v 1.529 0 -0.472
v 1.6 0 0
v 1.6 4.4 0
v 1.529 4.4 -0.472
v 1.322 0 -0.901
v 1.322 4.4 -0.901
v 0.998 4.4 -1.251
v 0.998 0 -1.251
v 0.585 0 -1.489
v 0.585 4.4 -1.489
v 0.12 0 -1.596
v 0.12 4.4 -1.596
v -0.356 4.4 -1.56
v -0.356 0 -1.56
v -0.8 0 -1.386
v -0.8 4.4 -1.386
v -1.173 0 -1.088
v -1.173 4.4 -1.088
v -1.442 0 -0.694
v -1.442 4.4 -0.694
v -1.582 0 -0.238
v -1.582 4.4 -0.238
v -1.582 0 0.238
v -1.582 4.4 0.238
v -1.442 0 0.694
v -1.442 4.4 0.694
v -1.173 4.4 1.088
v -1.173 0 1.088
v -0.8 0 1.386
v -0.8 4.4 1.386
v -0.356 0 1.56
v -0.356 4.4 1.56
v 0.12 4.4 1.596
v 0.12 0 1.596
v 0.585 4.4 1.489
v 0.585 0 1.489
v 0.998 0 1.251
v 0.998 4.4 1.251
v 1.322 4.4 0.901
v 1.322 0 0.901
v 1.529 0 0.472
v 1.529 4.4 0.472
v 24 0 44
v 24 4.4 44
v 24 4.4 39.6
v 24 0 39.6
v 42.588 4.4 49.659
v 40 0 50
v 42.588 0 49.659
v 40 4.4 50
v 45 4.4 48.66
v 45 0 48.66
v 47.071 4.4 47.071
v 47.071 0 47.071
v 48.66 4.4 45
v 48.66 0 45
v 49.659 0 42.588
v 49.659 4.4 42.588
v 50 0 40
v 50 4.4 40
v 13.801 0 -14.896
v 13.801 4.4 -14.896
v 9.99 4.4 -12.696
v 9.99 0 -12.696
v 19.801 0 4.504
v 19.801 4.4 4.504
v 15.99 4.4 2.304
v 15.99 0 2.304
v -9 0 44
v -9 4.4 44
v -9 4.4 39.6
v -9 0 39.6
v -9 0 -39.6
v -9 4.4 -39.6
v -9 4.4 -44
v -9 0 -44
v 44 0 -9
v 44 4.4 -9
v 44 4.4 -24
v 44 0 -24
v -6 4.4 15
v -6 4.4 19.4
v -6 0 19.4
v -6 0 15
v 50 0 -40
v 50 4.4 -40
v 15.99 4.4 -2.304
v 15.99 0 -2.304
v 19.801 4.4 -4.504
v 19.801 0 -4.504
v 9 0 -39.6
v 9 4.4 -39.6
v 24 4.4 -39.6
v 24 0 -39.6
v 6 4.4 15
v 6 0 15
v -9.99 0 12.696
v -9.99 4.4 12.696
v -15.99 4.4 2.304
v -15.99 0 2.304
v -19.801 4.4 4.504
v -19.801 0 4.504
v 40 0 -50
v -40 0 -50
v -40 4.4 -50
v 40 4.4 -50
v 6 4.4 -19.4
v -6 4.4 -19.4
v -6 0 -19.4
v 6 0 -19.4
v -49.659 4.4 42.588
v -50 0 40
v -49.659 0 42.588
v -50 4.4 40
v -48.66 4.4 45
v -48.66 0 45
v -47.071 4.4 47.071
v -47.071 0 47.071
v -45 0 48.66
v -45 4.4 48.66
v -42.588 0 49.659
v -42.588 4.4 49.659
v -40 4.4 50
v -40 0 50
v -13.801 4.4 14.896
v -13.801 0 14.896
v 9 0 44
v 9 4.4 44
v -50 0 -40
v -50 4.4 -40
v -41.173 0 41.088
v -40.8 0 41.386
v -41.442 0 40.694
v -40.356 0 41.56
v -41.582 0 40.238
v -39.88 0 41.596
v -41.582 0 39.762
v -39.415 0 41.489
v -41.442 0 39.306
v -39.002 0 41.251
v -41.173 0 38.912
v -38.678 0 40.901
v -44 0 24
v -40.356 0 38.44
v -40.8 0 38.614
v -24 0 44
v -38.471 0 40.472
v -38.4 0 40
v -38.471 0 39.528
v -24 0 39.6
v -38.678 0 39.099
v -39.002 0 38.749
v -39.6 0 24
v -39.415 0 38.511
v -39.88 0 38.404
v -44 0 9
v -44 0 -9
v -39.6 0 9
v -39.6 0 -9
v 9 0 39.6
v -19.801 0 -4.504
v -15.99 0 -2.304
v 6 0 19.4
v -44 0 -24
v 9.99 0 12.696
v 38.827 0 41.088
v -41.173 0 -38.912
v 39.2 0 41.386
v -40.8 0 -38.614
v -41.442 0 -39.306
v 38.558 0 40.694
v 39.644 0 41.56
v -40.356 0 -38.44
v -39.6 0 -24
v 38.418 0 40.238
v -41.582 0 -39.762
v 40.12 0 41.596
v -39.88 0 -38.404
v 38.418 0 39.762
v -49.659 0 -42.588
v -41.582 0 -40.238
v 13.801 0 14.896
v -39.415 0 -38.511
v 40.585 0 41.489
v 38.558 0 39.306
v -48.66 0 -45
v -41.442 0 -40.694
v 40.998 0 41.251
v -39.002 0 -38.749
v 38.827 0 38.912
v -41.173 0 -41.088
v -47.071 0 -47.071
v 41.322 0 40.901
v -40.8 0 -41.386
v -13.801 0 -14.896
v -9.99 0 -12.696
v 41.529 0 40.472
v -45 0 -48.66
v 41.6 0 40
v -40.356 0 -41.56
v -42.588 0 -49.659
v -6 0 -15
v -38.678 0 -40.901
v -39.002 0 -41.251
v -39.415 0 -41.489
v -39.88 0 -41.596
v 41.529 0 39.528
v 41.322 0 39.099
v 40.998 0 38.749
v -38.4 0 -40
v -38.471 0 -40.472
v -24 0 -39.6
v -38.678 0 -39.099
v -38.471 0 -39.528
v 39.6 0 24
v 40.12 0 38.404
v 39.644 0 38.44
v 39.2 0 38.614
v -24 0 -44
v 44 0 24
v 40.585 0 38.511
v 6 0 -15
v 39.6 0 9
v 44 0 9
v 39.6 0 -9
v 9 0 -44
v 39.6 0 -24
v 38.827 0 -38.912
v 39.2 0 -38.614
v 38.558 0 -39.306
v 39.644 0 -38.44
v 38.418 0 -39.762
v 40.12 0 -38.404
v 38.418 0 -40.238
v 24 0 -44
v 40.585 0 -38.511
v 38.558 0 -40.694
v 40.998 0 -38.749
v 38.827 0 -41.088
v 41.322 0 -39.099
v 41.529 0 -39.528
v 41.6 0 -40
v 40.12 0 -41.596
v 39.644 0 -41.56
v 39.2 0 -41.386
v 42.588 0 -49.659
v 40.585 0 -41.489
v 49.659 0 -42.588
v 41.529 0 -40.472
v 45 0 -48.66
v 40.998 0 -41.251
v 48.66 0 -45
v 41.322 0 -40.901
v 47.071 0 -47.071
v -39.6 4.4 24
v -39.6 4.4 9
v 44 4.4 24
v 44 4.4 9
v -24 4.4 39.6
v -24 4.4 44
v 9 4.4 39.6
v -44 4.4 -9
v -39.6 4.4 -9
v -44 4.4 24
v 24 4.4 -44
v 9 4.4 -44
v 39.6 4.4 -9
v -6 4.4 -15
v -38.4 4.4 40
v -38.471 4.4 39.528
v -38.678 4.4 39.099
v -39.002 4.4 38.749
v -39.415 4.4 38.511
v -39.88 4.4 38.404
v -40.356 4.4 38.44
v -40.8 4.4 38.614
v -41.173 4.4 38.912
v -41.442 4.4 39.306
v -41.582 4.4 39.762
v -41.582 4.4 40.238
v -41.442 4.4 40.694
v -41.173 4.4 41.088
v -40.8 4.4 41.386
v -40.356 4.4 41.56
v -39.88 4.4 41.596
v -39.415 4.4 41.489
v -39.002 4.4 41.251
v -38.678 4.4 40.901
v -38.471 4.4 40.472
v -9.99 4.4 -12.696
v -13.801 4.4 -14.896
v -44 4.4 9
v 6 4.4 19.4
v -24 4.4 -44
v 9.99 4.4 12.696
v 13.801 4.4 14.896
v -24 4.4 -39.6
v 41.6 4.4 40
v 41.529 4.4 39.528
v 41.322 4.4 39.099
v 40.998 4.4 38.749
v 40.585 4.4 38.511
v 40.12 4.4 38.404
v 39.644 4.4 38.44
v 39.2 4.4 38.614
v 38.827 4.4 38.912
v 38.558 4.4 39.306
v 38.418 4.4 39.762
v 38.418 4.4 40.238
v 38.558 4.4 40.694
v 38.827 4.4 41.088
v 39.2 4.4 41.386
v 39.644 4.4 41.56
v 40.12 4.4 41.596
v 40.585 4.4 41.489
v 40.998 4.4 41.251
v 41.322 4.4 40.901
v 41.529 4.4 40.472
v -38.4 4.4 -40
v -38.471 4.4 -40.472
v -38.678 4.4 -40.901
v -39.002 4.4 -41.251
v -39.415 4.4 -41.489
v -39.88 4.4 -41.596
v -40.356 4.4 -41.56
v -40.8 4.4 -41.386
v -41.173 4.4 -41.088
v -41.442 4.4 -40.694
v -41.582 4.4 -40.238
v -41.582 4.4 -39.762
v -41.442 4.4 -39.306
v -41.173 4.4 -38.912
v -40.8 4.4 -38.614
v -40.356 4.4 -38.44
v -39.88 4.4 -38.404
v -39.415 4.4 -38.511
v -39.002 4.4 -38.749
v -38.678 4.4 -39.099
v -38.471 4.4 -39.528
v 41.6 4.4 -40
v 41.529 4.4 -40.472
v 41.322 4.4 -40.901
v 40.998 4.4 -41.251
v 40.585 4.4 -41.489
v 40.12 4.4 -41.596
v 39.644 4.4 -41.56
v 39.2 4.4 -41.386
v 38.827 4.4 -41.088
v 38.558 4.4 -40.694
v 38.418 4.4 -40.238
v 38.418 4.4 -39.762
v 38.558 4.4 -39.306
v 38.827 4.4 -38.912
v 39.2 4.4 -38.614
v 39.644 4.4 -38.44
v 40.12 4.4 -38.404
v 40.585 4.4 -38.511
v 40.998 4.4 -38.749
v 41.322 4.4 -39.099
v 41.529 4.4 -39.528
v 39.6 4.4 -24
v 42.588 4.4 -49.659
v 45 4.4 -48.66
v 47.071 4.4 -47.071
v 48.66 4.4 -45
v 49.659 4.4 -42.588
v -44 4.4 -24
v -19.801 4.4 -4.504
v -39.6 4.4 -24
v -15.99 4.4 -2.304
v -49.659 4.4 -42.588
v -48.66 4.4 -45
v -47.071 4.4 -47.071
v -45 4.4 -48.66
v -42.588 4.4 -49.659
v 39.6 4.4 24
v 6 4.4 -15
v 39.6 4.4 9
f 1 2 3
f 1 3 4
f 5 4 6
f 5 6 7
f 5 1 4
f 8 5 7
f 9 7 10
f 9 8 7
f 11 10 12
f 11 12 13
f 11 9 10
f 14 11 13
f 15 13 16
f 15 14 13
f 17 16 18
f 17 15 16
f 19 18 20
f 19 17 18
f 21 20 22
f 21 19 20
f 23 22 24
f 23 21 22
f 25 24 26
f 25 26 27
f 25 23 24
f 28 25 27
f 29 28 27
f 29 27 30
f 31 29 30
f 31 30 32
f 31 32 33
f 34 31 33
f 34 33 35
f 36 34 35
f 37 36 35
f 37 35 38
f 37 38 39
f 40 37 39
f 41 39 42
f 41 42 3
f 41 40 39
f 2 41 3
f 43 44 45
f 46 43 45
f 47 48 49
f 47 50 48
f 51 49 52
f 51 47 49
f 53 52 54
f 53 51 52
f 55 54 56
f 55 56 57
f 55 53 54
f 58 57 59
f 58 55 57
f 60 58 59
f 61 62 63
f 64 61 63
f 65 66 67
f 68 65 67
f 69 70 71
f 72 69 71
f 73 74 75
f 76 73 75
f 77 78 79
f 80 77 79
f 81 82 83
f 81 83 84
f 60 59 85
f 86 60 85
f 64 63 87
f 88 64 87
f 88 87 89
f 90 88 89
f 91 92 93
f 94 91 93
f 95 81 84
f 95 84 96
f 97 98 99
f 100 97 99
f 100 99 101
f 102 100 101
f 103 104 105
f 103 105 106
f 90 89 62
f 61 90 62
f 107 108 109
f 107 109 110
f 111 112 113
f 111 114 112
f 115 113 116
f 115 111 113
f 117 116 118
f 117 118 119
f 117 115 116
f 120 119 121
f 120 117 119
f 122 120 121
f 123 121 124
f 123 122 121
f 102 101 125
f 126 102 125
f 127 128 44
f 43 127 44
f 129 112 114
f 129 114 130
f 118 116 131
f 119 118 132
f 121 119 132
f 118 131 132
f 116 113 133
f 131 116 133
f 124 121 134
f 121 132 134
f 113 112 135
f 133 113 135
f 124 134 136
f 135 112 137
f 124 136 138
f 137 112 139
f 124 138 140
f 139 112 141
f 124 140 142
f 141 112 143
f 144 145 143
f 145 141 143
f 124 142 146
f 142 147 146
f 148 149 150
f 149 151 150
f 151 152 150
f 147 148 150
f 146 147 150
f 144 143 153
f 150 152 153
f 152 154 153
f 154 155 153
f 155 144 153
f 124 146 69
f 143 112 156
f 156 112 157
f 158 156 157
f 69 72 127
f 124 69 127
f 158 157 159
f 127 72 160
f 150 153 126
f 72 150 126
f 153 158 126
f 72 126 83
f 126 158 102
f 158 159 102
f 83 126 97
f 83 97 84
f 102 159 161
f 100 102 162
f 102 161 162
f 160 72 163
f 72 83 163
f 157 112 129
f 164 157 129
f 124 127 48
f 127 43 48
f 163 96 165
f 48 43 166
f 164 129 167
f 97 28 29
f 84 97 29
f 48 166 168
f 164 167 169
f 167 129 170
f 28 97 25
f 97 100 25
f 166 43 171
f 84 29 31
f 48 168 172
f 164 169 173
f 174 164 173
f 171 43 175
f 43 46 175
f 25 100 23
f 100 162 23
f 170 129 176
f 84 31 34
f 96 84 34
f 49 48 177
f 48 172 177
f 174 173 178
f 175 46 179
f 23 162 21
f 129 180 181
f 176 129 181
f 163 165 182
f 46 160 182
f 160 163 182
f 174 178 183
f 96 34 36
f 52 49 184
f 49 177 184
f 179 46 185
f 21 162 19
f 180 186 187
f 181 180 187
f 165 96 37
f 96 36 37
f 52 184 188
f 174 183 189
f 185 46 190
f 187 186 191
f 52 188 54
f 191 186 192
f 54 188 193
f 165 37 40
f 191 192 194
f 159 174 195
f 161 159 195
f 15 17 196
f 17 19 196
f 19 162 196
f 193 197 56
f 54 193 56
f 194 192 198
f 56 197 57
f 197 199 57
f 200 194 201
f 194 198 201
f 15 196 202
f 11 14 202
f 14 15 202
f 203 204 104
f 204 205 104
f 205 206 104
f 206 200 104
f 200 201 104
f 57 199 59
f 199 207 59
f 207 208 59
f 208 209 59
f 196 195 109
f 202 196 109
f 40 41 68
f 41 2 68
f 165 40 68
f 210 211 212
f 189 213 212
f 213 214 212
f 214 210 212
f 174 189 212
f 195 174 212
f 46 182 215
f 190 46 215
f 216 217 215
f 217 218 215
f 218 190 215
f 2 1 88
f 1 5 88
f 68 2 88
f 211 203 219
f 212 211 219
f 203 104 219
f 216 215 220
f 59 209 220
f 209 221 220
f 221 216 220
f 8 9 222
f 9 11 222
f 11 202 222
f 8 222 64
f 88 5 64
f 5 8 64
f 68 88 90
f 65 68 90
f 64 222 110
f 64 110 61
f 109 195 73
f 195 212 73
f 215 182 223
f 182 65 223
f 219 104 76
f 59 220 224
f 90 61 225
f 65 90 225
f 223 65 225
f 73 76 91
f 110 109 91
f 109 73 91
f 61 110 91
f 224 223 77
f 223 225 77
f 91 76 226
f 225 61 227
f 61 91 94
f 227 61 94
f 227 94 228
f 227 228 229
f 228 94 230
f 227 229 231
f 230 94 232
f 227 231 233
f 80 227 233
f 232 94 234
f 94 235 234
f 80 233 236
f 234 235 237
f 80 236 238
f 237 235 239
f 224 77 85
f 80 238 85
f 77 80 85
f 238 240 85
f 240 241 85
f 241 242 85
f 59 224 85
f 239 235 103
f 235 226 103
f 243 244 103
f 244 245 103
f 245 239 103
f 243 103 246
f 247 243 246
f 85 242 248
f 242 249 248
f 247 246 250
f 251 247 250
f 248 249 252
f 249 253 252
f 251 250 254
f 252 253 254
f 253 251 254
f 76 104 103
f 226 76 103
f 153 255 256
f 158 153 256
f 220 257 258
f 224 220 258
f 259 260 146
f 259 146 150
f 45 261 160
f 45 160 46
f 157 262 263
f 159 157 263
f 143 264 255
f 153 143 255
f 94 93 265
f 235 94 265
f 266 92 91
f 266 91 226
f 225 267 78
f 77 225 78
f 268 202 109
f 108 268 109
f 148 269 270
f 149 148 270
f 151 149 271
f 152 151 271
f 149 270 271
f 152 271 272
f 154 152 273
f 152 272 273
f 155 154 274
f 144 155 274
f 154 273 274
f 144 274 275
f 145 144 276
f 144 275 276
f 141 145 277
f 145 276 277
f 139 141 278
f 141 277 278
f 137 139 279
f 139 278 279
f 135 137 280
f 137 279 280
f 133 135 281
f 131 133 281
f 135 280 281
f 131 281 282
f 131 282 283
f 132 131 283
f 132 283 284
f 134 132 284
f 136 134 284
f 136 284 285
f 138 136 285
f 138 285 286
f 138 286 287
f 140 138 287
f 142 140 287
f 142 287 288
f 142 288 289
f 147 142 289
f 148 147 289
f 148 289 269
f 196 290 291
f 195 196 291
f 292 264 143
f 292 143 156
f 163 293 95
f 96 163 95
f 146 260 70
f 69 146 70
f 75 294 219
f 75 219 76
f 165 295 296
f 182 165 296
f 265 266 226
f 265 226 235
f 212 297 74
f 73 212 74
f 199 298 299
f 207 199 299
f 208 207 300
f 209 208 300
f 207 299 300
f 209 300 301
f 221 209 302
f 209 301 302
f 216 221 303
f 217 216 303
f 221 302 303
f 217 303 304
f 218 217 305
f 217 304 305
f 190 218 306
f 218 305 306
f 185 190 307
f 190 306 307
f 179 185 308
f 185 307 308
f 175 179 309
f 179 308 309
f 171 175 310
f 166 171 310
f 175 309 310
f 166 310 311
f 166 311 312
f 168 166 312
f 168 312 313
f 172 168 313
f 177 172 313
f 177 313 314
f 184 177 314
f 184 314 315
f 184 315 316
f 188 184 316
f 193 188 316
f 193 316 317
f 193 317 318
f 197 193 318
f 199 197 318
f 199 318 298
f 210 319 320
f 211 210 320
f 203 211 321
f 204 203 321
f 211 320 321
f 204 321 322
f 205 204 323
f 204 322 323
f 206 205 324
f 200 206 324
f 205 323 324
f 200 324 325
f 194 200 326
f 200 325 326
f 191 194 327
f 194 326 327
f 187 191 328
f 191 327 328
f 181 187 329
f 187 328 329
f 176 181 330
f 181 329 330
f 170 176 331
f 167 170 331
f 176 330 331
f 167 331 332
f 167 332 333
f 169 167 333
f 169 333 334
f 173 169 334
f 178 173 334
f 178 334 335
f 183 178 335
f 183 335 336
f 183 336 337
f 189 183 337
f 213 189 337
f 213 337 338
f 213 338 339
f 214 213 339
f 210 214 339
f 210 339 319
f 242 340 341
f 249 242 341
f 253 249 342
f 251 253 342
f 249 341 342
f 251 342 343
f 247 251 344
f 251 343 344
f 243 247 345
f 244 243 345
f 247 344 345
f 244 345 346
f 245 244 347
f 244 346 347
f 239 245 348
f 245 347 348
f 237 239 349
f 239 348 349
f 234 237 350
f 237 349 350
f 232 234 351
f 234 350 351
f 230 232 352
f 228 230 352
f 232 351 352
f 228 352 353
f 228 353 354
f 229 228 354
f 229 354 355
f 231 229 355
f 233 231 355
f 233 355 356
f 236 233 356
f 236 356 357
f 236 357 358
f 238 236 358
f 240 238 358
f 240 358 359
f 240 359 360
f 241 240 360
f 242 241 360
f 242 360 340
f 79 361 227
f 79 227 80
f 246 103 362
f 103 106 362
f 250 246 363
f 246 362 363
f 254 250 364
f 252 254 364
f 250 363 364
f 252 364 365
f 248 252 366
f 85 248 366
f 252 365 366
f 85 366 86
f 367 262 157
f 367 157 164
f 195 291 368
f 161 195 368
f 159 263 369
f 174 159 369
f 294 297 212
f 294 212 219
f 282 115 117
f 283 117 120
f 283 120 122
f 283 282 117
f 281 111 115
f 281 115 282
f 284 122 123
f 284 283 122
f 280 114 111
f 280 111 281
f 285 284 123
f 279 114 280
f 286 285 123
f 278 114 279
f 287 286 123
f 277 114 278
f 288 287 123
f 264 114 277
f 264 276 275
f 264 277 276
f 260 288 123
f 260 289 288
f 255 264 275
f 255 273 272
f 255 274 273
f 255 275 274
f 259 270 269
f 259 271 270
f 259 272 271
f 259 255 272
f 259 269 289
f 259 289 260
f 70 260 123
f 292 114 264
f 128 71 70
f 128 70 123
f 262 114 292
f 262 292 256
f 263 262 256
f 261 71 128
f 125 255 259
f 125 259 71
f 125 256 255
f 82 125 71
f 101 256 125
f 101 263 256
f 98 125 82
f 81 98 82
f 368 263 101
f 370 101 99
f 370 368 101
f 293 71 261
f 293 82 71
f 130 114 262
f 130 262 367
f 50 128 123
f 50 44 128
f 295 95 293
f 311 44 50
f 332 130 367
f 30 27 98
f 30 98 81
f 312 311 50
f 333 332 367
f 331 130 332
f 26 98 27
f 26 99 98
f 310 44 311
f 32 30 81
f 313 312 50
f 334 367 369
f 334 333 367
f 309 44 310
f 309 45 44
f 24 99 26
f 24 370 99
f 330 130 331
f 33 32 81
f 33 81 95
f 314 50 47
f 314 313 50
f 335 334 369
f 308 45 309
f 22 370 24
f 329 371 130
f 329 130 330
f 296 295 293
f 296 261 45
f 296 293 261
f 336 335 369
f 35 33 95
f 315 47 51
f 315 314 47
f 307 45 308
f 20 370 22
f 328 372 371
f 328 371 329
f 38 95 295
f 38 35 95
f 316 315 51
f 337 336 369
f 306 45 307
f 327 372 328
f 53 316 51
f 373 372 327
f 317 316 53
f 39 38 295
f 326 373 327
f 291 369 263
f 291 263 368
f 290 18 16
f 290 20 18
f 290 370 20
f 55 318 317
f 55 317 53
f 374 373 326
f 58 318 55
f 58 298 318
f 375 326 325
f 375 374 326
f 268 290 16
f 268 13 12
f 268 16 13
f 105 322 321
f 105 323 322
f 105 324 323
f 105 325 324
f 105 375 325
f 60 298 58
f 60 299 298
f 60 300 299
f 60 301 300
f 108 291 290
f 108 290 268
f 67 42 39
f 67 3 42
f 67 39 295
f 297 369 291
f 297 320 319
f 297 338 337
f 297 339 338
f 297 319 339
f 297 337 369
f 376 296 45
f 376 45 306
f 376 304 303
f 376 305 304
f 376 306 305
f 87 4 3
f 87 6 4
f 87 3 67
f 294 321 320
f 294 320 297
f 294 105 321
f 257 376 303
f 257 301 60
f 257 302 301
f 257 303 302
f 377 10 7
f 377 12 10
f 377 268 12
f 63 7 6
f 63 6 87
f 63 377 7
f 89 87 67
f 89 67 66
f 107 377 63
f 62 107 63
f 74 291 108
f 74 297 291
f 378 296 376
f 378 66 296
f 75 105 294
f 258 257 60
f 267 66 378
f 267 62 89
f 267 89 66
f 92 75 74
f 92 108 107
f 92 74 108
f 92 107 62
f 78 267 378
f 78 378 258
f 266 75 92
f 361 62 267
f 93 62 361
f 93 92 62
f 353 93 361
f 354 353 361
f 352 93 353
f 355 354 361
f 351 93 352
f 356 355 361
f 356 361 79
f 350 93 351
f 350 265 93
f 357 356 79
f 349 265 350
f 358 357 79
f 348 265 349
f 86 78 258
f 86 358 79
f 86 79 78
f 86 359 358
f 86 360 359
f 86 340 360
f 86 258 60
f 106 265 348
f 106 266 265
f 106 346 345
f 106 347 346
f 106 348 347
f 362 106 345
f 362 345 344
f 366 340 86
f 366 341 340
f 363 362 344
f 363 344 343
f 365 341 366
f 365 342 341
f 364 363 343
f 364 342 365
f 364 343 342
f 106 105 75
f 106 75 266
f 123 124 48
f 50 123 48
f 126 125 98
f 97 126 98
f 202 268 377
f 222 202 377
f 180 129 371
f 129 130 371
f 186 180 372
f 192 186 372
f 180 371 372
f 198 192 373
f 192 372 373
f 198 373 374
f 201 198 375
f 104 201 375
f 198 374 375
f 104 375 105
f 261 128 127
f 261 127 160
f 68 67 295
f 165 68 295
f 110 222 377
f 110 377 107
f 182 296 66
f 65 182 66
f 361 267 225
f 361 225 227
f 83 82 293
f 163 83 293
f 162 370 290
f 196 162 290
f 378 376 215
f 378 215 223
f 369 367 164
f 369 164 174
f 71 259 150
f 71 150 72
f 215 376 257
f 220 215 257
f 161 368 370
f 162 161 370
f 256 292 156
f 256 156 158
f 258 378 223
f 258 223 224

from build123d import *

# Parameters (mm, degrees)
SKETCH_1_W          = 100
SKETCH_1_H          = 100
SKETCH_1_R          = 1.6
EXTRUDE_1_DEPTH     = 4.4
FILLET_1_R          = 10
CUT_EXTRUDE_1_REACH = 6.4
SKETCH_2_R          = 1.6
SKETCH_2_W          = 15
SKETCH_2_H          = 4.4
SKETCH_2_W_2        = 4.4
SKETCH_2_H_2        = 15
SKETCH_3_W          = 12
SKETCH_3_H          = 4.4
CUT_EXTRUDE_2_DEPTH = 5.4


with BuildPart() as part:
    # 草图1 → 凸台-拉伸1 (new body)
    with BuildSketch(Plane(origin=(0, 0, 0), x_dir=(1, 0, 0), z_dir=(0, 1, 0))):
        Rectangle(SKETCH_1_W, SKETCH_1_H)
        Circle(SKETCH_1_R, mode=Mode.SUBTRACT)
    extrude(amount=EXTRUDE_1_DEPTH)

    # 圆角1
    fillet_1_edges = [part.edges().sort_by_distance(p)[0] for p in [
        (50, 2.2, 50),
        (-50, 2.2, 50),
        (-50, 2.2, -50),
        (50, 2.2, -50),
    ]]
    fillet(fillet_1_edges, radius=FILLET_1_R)

    # 草图2 → 切除-拉伸1 (cut, up to next)
    with BuildSketch(Plane(origin=(0, 4.4, 0), x_dir=(1, 0, 0), z_dir=(0, 1, 0)), mode=Mode.PRIVATE) as cut_extrude_1_sk1:
        with Locations((40, 40)):
            Circle(SKETCH_2_R)
    cut_extrude_1_tool1 = extrude(cut_extrude_1_sk1.sketch, amount=-CUT_EXTRUDE_1_REACH, mode=Mode.PRIVATE) & part.part
    add(cut_extrude_1_tool1.solids().sort_by_distance((40, 4.4, -40))[0], mode=Mode.SUBTRACT)
    # 草图2 → 切除-拉伸1 (cut, up to next)
    with BuildSketch(Plane(origin=(0, 4.4, 0), x_dir=(1, 0, 0), z_dir=(0, 1, 0)), mode=Mode.PRIVATE) as cut_extrude_1_sk2:
        with Locations((40, -40)):
            Circle(SKETCH_2_R)
    cut_extrude_1_tool2 = extrude(cut_extrude_1_sk2.sketch, amount=-CUT_EXTRUDE_1_REACH, mode=Mode.PRIVATE) & part.part
    add(cut_extrude_1_tool2.solids().sort_by_distance((40, 4.4, 40))[0], mode=Mode.SUBTRACT)
    # 草图2 → 切除-拉伸1 (cut, up to next)
    with BuildSketch(Plane(origin=(0, 4.4, 0), x_dir=(1, 0, 0), z_dir=(0, 1, 0)), mode=Mode.PRIVATE) as cut_extrude_1_sk3:
        with Locations((-40, -40)):
            Circle(SKETCH_2_R)
    cut_extrude_1_tool3 = extrude(cut_extrude_1_sk3.sketch, amount=-CUT_EXTRUDE_1_REACH, mode=Mode.PRIVATE) & part.part
    add(cut_extrude_1_tool3.solids().sort_by_distance((-40, 4.4, 40))[0], mode=Mode.SUBTRACT)
    # 草图2 → 切除-拉伸1 (cut, up to next)
    with BuildSketch(Plane(origin=(0, 4.4, 0), x_dir=(1, 0, 0), z_dir=(0, 1, 0)), mode=Mode.PRIVATE) as cut_extrude_1_sk4:
        with Locations((-40, 40)):
            Circle(SKETCH_2_R)
    cut_extrude_1_tool4 = extrude(cut_extrude_1_sk4.sketch, amount=-CUT_EXTRUDE_1_REACH, mode=Mode.PRIVATE) & part.part
    add(cut_extrude_1_tool4.solids().sort_by_distance((-40, 4.4, -40))[0], mode=Mode.SUBTRACT)
    # 草图2 → 切除-拉伸1 (cut, up to next)
    with BuildSketch(Plane(origin=(0, 4.4, 0), x_dir=(1, 0, 0), z_dir=(0, 1, 0)), mode=Mode.PRIVATE) as cut_extrude_1_sk5:
        with Locations((-16.5, 41.8)):
            Rectangle(SKETCH_2_W, SKETCH_2_H)
    cut_extrude_1_tool5 = extrude(cut_extrude_1_sk5.sketch, amount=-CUT_EXTRUDE_1_REACH, mode=Mode.PRIVATE) & part.part
    add(cut_extrude_1_tool5.solids().sort_by_distance((-16.5, 4.4, -41.8))[0], mode=Mode.SUBTRACT)
    # 草图2 → 切除-拉伸1 (cut, up to next)
    with BuildSketch(Plane(origin=(0, 4.4, 0), x_dir=(1, 0, 0), z_dir=(0, 1, 0)), mode=Mode.PRIVATE) as cut_extrude_1_sk6:
        with Locations((16.5, 41.8)):
            Rectangle(SKETCH_2_W, SKETCH_2_H)
    cut_extrude_1_tool6 = extrude(cut_extrude_1_sk6.sketch, amount=-CUT_EXTRUDE_1_REACH, mode=Mode.PRIVATE) & part.part
    add(cut_extrude_1_tool6.solids().sort_by_distance((16.5, 4.4, -41.8))[0], mode=Mode.SUBTRACT)
    # 草图2 → 切除-拉伸1 (cut, up to next)
    with BuildSketch(Plane(origin=(0, 4.4, 0), x_dir=(1, 0, 0), z_dir=(0, 1, 0)), mode=Mode.PRIVATE) as cut_extrude_1_sk7:
        with Locations((41.8, -16.5)):
            Rectangle(SKETCH_2_W_2, SKETCH_2_H_2)
    cut_extrude_1_tool7 = extrude(cut_extrude_1_sk7.sketch, amount=-CUT_EXTRUDE_1_REACH, mode=Mode.PRIVATE) & part.part
    add(cut_extrude_1_tool7.solids().sort_by_distance((41.8, 4.4, 16.5))[0], mode=Mode.SUBTRACT)
    # 草图2 → 切除-拉伸1 (cut, up to next)
    with BuildSketch(Plane(origin=(0, 4.4, 0), x_dir=(1, 0, 0), z_dir=(0, 1, 0)), mode=Mode.PRIVATE) as cut_extrude_1_sk8:
        with Locations((41.8, 16.5)):
            Rectangle(SKETCH_2_W_2, SKETCH_2_H_2)
    cut_extrude_1_tool8 = extrude(cut_extrude_1_sk8.sketch, amount=-CUT_EXTRUDE_1_REACH, mode=Mode.PRIVATE) & part.part
    add(cut_extrude_1_tool8.solids().sort_by_distance((41.8, 4.4, -16.5))[0], mode=Mode.SUBTRACT)
    # 草图2 → 切除-拉伸1 (cut, up to next)
    with BuildSketch(Plane(origin=(0, 4.4, 0), x_dir=(1, 0, 0), z_dir=(0, 1, 0)), mode=Mode.PRIVATE) as cut_extrude_1_sk9:
        with Locations((-16.5, -41.8)):
            Rectangle(SKETCH_2_W, SKETCH_2_H)
    cut_extrude_1_tool9 = extrude(cut_extrude_1_sk9.sketch, amount=-CUT_EXTRUDE_1_REACH, mode=Mode.PRIVATE) & part.part
    add(cut_extrude_1_tool9.solids().sort_by_distance((-16.5, 4.4, 41.8))[0], mode=Mode.SUBTRACT)
    # 草图2 → 切除-拉伸1 (cut, up to next)
    with BuildSketch(Plane(origin=(0, 4.4, 0), x_dir=(1, 0, 0), z_dir=(0, 1, 0)), mode=Mode.PRIVATE) as cut_extrude_1_sk10:
        with Locations((16.5, -41.8)):
            Rectangle(SKETCH_2_W, SKETCH_2_H)
    cut_extrude_1_tool10 = extrude(cut_extrude_1_sk10.sketch, amount=-CUT_EXTRUDE_1_REACH, mode=Mode.PRIVATE) & part.part
    add(cut_extrude_1_tool10.solids().sort_by_distance((16.5, 4.4, 41.8))[0], mode=Mode.SUBTRACT)
    # 草图2 → 切除-拉伸1 (cut, up to next)
    with BuildSketch(Plane(origin=(0, 4.4, 0), x_dir=(1, 0, 0), z_dir=(0, 1, 0)), mode=Mode.PRIVATE) as cut_extrude_1_sk11:
        with Locations((-41.8, 16.5)):
            Rectangle(SKETCH_2_W_2, SKETCH_2_H_2)
    cut_extrude_1_tool11 = extrude(cut_extrude_1_sk11.sketch, amount=-CUT_EXTRUDE_1_REACH, mode=Mode.PRIVATE) & part.part
    add(cut_extrude_1_tool11.solids().sort_by_distance((-41.8, 4.4, -16.5))[0], mode=Mode.SUBTRACT)
    # 草图2 → 切除-拉伸1 (cut, up to next)
    with BuildSketch(Plane(origin=(0, 4.4, 0), x_dir=(1, 0, 0), z_dir=(0, 1, 0)), mode=Mode.PRIVATE) as cut_extrude_1_sk12:
        with Locations((-41.8, -16.5)):
            Rectangle(SKETCH_2_W_2, SKETCH_2_H_2)
    cut_extrude_1_tool12 = extrude(cut_extrude_1_sk12.sketch, amount=-CUT_EXTRUDE_1_REACH, mode=Mode.PRIVATE) & part.part
    add(cut_extrude_1_tool12.solids().sort_by_distance((-41.8, 4.4, 16.5))[0], mode=Mode.SUBTRACT)

    # 草图3 → 切除-拉伸2 (cut, through all)
    with BuildSketch(Plane(origin=(0, 4.4, 0), x_dir=(1, 0, 0), z_dir=(0, 1, 0))):
        with Locations((0, 17.2)):
            Rectangle(SKETCH_3_W, SKETCH_3_H)
        Polygon((13.800892833, 14.896152423), (9.990381057, 12.696152423), (15.990381057, 2.303847577), (19.800892833, 4.503847577), align=None)
        Polygon((19.800892833, -4.503847577), (15.990381057, -2.303847577), (9.990381057, -12.696152423), (13.800892833, -14.896152423), align=None)
        with Locations((0, -17.2)):
            Rectangle(SKETCH_3_W, SKETCH_3_H)
        Polygon((-13.800892833, -14.896152423), (-9.990381057, -12.696152423), (-15.990381057, -2.303847577), (-19.800892833, -4.503847577), align=None)
        Polygon((-19.800892833, 4.503847577), (-15.990381057, 2.303847577), (-9.990381057, 12.696152423), (-13.800892833, 14.896152423), align=None)
    extrude(amount=-CUT_EXTRUDE_2_DEPTH, mode=Mode.SUBTRACT)


solid = part.part
